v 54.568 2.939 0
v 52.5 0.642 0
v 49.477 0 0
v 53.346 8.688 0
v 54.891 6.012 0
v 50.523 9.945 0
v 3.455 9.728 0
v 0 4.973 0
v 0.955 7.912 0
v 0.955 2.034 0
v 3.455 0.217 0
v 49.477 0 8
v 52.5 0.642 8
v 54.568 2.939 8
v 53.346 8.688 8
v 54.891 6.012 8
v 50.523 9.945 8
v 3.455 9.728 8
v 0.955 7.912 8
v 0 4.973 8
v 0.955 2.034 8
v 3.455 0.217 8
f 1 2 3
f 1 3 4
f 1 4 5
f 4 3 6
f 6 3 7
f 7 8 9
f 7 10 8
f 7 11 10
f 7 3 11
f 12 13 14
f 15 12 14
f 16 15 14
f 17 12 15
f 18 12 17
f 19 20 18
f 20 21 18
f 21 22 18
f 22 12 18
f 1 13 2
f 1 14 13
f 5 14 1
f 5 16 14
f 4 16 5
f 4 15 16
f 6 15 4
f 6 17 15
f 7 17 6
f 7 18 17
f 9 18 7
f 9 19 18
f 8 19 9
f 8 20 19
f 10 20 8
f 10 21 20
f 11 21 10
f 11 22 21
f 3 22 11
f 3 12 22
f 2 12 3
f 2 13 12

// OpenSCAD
$fn = 32;

// ----------------------------------------------------------------------
// Key bar: parallel key, 8 mm thick
// ----------------------------------------------------------------------

// --- parameters (mm) ---
profile_height = 8;       // extrusion height
profile_points = 11;      // points of the closed outline

profile = [[0, 4.973], [0.955, 2.034], [3.455, 0.217], [49.477, 0], [52.5, 0.642], [54.568, 2.939], [54.891, 6.012], [53.346, 8.688], [50.523, 9.945], [3.455, 9.728], [0.955, 7.912]];  // single closed polygon, 11 points, counter clockwise

// --- the one profile operation ---
linear_extrude(height = profile_height) polygon(points = profile);
